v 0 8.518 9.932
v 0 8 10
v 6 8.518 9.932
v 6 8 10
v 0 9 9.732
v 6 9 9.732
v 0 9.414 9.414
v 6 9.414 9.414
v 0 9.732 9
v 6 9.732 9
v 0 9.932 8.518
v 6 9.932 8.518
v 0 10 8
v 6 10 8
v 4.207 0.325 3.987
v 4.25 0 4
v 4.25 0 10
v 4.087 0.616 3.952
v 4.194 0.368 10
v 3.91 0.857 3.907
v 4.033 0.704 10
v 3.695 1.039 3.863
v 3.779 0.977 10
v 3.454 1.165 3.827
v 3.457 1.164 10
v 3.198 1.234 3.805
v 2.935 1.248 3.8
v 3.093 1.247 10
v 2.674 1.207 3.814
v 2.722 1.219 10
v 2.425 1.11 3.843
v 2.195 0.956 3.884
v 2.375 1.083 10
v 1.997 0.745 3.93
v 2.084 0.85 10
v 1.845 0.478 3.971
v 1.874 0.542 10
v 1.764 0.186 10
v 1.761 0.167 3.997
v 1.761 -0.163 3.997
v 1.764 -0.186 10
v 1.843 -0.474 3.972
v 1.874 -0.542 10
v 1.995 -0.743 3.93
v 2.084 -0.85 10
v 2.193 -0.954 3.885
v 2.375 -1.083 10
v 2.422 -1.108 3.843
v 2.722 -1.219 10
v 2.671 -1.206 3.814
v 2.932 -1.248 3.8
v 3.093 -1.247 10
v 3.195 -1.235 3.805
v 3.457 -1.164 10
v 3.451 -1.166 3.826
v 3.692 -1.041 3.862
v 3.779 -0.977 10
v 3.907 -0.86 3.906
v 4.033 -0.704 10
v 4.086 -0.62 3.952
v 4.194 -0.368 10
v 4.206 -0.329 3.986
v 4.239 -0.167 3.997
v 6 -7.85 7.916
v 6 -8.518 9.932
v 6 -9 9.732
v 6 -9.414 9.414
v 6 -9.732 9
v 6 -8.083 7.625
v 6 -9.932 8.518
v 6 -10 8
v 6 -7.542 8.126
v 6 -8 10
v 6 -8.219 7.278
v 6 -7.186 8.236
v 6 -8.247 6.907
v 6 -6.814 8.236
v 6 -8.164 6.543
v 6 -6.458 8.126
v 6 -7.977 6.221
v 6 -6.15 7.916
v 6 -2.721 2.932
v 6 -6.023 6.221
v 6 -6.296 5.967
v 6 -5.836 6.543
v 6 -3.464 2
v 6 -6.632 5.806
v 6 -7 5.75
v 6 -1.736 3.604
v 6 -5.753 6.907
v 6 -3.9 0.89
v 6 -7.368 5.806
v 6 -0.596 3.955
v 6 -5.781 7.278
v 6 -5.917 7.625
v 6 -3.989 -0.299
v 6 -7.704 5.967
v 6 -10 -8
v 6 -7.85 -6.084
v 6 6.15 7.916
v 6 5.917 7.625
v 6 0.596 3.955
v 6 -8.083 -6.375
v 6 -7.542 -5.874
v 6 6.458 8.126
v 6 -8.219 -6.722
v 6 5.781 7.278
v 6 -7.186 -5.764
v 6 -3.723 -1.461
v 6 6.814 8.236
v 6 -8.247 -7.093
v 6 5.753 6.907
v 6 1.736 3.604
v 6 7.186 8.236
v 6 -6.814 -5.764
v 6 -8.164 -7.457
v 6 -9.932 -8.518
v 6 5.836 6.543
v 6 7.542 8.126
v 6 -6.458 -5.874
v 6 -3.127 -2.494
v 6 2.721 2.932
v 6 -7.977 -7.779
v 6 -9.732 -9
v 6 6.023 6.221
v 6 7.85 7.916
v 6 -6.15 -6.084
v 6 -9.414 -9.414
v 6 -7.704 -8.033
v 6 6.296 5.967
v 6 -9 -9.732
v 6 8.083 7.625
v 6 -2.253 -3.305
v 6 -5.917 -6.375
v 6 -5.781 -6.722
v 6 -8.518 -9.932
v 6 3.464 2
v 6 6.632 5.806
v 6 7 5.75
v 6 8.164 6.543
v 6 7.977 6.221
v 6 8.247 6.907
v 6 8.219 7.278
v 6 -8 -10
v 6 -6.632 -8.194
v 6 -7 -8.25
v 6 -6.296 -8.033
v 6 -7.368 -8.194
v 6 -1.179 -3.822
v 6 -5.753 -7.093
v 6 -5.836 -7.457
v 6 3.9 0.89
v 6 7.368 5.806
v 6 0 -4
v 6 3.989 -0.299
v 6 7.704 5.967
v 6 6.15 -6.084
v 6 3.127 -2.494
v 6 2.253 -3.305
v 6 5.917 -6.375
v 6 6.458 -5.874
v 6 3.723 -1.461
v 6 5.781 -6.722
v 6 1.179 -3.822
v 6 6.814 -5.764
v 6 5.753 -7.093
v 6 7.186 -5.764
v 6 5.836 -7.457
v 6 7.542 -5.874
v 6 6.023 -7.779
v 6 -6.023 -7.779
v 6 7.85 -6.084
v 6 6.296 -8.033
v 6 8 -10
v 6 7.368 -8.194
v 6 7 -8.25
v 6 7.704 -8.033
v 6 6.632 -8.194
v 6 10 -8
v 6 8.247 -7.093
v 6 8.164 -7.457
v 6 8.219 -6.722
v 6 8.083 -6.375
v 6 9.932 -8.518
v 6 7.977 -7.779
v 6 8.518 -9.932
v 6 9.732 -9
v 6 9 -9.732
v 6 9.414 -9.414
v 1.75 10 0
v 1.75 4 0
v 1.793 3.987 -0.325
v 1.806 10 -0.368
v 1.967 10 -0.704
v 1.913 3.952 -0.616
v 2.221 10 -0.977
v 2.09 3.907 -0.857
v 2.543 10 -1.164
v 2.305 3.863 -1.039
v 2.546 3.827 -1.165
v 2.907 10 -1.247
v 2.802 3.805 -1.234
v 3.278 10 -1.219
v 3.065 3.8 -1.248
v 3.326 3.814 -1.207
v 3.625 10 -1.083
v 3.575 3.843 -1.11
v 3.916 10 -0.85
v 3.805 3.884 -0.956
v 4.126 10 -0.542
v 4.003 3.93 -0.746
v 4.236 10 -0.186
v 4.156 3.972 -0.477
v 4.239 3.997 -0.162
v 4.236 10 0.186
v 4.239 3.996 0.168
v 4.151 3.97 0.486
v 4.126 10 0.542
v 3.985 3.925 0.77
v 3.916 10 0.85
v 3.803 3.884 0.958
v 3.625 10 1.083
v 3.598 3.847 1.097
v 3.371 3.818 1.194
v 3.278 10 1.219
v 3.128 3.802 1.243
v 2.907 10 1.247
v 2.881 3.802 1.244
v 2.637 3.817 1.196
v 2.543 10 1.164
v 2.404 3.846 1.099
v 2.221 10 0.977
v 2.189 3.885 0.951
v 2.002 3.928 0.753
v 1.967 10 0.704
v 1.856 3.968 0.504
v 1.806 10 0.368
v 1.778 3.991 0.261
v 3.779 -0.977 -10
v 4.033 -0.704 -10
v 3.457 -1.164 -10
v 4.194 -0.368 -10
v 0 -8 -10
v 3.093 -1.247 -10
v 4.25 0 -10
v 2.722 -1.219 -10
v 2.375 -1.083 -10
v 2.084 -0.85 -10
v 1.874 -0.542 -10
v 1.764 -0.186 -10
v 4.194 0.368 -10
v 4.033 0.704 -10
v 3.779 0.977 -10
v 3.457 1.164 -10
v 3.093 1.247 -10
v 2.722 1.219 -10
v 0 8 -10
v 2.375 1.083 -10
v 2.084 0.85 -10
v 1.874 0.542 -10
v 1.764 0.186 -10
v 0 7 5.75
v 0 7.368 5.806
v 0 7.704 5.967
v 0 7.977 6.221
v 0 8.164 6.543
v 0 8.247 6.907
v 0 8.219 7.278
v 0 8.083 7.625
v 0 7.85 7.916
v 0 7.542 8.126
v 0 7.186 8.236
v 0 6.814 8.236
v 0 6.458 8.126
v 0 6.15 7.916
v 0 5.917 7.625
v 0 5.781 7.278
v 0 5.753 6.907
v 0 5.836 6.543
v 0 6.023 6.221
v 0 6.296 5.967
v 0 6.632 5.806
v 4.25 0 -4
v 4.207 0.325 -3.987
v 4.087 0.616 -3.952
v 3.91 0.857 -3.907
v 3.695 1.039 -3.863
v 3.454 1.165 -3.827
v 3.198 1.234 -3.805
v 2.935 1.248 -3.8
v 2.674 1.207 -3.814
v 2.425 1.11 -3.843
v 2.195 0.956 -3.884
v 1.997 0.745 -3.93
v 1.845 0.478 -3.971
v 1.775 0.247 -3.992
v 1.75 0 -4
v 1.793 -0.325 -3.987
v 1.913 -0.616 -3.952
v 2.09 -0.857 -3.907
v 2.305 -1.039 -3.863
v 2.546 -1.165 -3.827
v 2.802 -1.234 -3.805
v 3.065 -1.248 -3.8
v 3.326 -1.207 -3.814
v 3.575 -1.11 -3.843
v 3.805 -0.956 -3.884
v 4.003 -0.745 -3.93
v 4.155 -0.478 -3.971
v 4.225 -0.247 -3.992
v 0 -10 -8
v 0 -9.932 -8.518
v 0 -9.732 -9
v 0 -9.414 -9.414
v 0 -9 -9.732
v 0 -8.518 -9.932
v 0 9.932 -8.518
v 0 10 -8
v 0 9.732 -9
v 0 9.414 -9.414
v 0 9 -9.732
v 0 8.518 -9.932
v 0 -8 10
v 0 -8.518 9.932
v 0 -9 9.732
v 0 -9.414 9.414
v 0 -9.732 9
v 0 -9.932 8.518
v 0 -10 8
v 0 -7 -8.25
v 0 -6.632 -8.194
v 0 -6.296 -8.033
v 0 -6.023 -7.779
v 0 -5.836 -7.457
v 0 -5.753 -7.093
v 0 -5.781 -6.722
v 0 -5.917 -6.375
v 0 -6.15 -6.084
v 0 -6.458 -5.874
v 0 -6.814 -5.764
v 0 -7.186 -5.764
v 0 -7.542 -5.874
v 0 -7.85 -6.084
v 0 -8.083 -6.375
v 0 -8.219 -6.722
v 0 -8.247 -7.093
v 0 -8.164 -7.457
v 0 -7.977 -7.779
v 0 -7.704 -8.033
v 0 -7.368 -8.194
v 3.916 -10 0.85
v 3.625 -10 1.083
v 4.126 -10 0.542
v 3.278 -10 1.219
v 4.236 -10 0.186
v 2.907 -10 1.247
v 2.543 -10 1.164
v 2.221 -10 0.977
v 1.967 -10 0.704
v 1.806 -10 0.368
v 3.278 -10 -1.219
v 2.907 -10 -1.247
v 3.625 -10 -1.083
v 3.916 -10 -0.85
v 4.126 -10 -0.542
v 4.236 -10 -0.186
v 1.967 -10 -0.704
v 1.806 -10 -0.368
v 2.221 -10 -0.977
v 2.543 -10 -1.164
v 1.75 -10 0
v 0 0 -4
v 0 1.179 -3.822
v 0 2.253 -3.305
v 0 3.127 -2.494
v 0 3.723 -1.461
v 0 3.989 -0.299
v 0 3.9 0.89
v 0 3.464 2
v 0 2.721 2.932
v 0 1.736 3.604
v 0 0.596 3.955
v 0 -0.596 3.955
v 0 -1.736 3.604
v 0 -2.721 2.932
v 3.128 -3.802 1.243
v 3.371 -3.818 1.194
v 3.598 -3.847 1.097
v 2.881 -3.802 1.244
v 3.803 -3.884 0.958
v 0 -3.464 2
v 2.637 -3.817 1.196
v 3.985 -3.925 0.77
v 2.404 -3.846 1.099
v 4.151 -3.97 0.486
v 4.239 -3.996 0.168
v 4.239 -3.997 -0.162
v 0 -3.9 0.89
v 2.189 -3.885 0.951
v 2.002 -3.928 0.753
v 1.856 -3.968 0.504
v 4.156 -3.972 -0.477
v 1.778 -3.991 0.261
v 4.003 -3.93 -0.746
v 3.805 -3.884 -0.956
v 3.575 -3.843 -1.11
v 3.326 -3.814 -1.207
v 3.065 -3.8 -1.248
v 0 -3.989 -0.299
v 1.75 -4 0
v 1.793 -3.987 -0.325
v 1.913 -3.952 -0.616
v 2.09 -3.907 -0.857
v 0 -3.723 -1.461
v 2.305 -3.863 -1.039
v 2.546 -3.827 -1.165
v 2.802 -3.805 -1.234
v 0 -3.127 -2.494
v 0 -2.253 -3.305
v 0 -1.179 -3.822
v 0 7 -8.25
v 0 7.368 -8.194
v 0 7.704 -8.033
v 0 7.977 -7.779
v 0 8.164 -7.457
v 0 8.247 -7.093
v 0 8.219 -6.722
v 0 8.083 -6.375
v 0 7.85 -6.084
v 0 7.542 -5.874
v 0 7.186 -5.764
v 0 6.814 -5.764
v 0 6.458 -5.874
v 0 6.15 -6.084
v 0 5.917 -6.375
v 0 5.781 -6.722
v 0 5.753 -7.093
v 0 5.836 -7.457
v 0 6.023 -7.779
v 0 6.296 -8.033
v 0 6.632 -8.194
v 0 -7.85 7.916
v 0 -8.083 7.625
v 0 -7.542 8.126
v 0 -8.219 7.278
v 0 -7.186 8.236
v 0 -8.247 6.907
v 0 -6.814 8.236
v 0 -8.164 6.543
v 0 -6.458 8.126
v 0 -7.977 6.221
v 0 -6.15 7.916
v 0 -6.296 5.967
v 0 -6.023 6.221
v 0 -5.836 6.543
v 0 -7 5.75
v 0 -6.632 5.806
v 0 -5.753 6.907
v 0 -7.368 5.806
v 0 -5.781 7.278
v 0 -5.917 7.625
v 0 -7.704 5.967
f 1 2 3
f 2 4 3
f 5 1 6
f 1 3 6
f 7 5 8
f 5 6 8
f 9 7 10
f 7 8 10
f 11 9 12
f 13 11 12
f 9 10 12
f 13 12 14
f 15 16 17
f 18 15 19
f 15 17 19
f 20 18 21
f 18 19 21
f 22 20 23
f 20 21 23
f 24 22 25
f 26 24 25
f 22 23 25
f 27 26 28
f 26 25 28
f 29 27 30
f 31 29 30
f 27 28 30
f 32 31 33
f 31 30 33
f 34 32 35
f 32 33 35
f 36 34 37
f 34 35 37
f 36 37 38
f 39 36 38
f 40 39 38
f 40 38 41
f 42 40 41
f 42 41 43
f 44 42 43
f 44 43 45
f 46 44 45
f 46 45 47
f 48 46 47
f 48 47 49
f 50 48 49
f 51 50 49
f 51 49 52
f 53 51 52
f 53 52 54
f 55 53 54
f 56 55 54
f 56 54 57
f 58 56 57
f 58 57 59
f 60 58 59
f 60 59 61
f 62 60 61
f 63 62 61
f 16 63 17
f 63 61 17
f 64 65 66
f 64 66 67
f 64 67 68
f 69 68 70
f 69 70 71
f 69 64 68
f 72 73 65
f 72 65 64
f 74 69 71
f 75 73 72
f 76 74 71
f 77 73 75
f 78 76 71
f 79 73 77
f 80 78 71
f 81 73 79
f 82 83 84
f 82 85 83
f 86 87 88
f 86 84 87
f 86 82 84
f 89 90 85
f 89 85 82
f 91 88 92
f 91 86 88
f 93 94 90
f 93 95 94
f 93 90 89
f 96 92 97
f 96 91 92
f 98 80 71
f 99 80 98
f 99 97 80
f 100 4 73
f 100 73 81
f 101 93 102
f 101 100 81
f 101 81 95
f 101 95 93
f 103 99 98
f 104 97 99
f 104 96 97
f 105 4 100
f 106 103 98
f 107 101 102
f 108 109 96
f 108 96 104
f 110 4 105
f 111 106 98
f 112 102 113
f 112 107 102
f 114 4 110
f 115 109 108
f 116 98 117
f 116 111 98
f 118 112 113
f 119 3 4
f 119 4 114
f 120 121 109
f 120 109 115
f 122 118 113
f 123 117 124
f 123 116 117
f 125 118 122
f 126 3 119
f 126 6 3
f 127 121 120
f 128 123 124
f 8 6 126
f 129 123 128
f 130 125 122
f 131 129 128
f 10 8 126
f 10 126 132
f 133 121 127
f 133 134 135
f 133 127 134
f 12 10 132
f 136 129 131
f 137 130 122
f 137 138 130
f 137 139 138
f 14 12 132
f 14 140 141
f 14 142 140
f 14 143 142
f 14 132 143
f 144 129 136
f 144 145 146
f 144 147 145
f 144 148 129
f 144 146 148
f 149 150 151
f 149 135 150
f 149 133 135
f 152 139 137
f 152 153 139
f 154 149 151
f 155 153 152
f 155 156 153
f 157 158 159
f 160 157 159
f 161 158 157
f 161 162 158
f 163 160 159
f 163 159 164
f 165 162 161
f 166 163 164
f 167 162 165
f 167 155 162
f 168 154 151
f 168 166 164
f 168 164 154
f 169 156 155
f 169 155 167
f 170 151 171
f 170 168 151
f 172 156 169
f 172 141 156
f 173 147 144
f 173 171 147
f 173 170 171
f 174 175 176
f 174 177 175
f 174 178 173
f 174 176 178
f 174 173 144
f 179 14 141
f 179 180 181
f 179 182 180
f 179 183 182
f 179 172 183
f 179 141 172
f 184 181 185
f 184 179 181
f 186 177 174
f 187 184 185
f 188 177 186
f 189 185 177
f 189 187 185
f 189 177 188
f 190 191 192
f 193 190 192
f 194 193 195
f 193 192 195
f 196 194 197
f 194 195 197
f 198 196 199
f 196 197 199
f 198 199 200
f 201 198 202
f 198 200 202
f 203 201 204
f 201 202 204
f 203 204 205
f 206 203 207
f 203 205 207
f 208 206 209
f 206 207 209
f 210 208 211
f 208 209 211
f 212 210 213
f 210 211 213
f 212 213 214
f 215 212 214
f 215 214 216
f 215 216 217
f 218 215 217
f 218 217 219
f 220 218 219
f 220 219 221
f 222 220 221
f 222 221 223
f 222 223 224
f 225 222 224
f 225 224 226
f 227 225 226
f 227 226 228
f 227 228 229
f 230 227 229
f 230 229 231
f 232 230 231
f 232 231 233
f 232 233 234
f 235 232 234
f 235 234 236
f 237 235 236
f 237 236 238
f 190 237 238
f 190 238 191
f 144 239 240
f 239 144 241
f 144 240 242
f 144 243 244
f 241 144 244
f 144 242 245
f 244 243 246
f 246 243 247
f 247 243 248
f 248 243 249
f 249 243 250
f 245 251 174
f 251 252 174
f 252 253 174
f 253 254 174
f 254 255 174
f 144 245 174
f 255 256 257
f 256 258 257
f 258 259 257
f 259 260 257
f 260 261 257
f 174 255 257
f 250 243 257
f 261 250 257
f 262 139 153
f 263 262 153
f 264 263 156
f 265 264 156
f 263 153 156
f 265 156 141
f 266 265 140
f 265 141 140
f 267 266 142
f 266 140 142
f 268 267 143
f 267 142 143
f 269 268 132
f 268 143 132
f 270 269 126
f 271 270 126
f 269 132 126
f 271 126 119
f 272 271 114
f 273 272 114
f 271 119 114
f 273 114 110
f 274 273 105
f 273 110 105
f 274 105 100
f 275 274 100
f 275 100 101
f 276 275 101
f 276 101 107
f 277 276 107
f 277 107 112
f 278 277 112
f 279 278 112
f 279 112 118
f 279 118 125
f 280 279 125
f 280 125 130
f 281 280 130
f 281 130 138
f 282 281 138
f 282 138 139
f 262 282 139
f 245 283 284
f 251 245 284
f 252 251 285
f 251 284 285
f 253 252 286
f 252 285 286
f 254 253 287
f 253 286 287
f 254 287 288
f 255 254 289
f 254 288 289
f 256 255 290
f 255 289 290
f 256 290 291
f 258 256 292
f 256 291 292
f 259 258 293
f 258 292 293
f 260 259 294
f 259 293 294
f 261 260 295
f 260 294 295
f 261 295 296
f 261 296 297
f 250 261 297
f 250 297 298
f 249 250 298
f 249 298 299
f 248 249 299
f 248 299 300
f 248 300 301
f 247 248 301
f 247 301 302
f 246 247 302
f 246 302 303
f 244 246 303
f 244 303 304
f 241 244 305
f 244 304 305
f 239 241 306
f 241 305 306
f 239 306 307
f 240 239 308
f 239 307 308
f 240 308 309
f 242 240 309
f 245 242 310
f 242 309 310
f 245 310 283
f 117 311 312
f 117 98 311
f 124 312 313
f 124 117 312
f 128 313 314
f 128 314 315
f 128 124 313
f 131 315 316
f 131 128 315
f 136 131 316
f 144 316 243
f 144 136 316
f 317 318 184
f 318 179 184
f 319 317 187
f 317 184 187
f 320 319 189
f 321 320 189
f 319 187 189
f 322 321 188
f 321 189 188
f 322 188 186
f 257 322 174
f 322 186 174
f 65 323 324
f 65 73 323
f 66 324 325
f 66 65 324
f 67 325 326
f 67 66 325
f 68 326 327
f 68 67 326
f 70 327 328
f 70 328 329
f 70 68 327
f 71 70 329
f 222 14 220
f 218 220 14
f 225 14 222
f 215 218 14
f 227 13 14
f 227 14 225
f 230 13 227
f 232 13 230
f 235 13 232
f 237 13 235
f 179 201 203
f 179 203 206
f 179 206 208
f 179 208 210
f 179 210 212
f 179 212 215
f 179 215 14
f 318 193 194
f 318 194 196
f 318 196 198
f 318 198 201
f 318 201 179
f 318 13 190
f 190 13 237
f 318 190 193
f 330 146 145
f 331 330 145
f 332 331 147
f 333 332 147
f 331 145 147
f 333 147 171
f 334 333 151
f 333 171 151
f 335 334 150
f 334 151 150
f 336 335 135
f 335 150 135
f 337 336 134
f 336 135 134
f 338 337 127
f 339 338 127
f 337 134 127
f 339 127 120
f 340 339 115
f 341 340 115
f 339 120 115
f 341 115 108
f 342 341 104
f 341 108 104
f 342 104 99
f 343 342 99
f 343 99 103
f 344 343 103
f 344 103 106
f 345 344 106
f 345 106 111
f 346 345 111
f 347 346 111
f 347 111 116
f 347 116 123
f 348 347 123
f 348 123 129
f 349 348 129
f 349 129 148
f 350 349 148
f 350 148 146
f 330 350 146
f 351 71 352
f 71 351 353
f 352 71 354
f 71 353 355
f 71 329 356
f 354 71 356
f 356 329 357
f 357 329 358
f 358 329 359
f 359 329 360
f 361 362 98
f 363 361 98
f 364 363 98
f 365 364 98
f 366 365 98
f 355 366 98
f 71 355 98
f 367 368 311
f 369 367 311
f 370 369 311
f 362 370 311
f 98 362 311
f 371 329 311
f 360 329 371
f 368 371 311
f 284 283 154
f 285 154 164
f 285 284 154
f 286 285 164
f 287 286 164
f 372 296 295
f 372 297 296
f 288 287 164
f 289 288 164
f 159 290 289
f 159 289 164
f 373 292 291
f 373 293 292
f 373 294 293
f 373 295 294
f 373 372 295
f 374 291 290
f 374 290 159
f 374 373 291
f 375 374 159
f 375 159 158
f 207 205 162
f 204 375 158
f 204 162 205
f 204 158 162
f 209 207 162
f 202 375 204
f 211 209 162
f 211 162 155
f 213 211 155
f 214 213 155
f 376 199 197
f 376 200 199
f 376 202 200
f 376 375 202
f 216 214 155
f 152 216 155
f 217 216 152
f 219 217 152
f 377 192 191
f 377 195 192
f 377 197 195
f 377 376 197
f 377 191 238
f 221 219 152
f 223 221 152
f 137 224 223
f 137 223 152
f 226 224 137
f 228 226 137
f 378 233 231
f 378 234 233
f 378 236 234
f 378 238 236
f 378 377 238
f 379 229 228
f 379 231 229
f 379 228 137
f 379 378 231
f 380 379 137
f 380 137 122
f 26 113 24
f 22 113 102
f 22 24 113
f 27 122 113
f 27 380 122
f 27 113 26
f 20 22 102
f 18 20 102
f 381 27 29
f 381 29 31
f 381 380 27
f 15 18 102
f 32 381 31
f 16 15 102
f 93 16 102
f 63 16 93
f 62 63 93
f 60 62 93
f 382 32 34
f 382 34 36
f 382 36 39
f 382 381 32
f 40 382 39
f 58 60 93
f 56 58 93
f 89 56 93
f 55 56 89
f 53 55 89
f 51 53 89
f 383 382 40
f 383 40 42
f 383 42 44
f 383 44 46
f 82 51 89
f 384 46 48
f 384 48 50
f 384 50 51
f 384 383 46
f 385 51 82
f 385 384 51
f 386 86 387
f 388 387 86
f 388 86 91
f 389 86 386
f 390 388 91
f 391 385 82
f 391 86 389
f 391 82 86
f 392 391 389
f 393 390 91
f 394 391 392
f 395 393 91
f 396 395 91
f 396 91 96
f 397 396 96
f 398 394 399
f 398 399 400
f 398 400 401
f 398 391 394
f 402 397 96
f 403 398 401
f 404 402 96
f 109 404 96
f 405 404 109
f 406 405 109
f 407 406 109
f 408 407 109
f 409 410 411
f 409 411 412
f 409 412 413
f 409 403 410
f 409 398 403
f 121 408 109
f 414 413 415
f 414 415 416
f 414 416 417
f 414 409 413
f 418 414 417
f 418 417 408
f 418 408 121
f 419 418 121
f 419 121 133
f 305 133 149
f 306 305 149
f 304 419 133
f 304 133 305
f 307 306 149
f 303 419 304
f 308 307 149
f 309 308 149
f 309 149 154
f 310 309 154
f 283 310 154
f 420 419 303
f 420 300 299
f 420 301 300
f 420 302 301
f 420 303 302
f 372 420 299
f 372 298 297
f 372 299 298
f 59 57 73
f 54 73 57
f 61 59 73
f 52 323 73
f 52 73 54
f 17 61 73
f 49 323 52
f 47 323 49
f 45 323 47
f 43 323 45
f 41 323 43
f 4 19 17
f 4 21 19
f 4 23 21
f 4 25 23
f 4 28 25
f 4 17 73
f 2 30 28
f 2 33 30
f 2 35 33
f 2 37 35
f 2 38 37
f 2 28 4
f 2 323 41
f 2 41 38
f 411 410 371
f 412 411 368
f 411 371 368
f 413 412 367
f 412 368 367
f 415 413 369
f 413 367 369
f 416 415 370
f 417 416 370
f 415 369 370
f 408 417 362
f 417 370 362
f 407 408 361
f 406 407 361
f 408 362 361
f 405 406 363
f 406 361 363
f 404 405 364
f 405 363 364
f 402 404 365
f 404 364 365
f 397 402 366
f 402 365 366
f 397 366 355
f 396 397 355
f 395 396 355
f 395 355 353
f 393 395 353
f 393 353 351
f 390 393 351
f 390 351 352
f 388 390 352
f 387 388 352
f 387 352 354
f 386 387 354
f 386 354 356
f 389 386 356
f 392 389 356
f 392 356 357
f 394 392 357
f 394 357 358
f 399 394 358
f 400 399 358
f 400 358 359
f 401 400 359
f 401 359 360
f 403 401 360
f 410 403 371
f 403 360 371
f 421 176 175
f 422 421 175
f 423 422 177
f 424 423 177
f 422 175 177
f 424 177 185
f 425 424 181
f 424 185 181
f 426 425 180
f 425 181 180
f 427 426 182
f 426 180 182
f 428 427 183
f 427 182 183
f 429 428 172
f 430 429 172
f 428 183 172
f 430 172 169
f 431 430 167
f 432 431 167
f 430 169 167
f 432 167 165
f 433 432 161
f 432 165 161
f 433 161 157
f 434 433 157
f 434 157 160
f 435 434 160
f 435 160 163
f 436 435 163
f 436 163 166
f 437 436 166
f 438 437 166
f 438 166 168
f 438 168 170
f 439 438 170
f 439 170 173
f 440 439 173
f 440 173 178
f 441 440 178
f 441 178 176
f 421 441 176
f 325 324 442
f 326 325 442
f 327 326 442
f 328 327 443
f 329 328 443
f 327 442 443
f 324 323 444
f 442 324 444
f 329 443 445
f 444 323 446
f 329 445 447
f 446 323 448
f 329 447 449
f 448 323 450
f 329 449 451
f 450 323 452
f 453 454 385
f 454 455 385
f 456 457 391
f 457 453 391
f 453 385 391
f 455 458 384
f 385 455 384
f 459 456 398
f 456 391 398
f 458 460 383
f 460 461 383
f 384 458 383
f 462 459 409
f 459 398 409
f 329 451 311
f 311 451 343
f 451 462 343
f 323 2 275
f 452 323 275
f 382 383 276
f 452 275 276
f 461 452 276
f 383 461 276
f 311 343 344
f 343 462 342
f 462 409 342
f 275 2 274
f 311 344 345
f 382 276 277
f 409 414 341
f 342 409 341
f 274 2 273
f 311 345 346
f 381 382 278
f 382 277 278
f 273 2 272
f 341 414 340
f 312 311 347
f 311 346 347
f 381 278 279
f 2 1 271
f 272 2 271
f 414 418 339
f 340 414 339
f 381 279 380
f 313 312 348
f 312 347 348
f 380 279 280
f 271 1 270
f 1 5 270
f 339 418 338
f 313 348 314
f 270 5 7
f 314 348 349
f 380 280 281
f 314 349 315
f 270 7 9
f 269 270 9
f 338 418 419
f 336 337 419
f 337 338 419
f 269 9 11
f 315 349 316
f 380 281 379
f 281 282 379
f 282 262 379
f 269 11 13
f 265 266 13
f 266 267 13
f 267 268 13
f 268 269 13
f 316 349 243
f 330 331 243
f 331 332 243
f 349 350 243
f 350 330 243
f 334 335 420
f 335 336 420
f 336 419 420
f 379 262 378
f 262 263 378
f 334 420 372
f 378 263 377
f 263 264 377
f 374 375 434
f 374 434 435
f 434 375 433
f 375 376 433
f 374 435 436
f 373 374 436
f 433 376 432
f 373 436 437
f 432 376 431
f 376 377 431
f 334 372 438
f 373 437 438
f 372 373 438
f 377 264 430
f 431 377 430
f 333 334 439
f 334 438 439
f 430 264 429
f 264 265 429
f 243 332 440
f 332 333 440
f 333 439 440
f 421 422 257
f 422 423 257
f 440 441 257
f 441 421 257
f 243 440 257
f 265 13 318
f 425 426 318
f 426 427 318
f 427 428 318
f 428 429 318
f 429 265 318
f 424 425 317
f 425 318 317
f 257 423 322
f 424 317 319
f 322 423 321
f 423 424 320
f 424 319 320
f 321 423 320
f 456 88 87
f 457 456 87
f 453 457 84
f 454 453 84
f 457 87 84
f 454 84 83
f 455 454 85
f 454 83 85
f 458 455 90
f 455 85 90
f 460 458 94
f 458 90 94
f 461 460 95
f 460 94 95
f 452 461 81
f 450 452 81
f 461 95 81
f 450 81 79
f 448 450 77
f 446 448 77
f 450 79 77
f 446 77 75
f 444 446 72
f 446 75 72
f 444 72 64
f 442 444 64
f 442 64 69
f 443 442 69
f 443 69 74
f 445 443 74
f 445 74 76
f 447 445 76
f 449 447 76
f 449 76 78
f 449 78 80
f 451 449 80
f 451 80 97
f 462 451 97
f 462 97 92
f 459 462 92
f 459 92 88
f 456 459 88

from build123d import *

# Parameters (mm, degrees)
SKETCH_3_W          = 20
SKETCH_3_H          = 20
SKETCH_3_R          = 4
EXTRUDE_2_DEPTH     = 6
SKETCH_4_R          = 1
CUT_EXTRUDE_1_DEPTH = 6
HOLE_WIZARD_M3_1_D  = 2.5
HOLE_WIZARD_M3_2_D  = 2.5
FILLET_1_R          = 2
HOLE_WIZARD_M3_3_D  = 2.5


with BuildPart() as part:
    # 草图3 → 凸台-拉伸2 (new body)
    with BuildSketch(Plane(origin=(0, 0, 0), x_dir=(0, 0, -1), z_dir=(1, 0, 0))):
        Rectangle(SKETCH_3_W, SKETCH_3_H)
        Circle(SKETCH_3_R, mode=Mode.SUBTRACT)
    extrude(amount=EXTRUDE_2_DEPTH)

    # 草图4 → 切除-拉伸1 (cut)
    with BuildSketch(Plane(origin=(6, 0, 0), x_dir=(0, 0, -1), z_dir=(1, 0, 0))):
        with Locations((-7, 7)):
            Circle(SKETCH_4_R)
        with Locations((7, 7)):
            Circle(SKETCH_4_R)
        with Locations((-7, -7)):
            Circle(SKETCH_4_R)
        with Locations((7, -7)):
            Circle(SKETCH_4_R)
    extrude(amount=-CUT_EXTRUDE_1_DEPTH, mode=Mode.SUBTRACT)

    # M3 螺纹孔1 (through all)
    with Locations(Plane(origin=(0, 10, 0), x_dir=(1, 0, 0), z_dir=(0, 1, 0))):
        with Locations((3, 0)):
            Hole(HOLE_WIZARD_M3_1_D / 2)

    # M3 螺纹孔2 (through all)
    with Locations(Plane(origin=(0, 0, -10), x_dir=(-1, 0, 0), z_dir=(0, 0, -1))):
        with Locations((-3, 0)):
            Hole(HOLE_WIZARD_M3_2_D / 2)

    # 圆角1
    fillet_1_edges = [part.edges().sort_by_distance(p)[0] for p in [
        (3, 10, 10),
        (3, 10, -10),
        (3, -10, -10),
        (3, -10, 10),
    ]]
    fillet(fillet_1_edges, radius=FILLET_1_R)

    # M3 螺纹孔3 (through all)
    with Locations(Plane.ZY):
        with Locations((-7, 7), (7, 7), (-7, -7), (7, -7)):
            Hole(HOLE_WIZARD_M3_3_D / 2)


solid = part.part
